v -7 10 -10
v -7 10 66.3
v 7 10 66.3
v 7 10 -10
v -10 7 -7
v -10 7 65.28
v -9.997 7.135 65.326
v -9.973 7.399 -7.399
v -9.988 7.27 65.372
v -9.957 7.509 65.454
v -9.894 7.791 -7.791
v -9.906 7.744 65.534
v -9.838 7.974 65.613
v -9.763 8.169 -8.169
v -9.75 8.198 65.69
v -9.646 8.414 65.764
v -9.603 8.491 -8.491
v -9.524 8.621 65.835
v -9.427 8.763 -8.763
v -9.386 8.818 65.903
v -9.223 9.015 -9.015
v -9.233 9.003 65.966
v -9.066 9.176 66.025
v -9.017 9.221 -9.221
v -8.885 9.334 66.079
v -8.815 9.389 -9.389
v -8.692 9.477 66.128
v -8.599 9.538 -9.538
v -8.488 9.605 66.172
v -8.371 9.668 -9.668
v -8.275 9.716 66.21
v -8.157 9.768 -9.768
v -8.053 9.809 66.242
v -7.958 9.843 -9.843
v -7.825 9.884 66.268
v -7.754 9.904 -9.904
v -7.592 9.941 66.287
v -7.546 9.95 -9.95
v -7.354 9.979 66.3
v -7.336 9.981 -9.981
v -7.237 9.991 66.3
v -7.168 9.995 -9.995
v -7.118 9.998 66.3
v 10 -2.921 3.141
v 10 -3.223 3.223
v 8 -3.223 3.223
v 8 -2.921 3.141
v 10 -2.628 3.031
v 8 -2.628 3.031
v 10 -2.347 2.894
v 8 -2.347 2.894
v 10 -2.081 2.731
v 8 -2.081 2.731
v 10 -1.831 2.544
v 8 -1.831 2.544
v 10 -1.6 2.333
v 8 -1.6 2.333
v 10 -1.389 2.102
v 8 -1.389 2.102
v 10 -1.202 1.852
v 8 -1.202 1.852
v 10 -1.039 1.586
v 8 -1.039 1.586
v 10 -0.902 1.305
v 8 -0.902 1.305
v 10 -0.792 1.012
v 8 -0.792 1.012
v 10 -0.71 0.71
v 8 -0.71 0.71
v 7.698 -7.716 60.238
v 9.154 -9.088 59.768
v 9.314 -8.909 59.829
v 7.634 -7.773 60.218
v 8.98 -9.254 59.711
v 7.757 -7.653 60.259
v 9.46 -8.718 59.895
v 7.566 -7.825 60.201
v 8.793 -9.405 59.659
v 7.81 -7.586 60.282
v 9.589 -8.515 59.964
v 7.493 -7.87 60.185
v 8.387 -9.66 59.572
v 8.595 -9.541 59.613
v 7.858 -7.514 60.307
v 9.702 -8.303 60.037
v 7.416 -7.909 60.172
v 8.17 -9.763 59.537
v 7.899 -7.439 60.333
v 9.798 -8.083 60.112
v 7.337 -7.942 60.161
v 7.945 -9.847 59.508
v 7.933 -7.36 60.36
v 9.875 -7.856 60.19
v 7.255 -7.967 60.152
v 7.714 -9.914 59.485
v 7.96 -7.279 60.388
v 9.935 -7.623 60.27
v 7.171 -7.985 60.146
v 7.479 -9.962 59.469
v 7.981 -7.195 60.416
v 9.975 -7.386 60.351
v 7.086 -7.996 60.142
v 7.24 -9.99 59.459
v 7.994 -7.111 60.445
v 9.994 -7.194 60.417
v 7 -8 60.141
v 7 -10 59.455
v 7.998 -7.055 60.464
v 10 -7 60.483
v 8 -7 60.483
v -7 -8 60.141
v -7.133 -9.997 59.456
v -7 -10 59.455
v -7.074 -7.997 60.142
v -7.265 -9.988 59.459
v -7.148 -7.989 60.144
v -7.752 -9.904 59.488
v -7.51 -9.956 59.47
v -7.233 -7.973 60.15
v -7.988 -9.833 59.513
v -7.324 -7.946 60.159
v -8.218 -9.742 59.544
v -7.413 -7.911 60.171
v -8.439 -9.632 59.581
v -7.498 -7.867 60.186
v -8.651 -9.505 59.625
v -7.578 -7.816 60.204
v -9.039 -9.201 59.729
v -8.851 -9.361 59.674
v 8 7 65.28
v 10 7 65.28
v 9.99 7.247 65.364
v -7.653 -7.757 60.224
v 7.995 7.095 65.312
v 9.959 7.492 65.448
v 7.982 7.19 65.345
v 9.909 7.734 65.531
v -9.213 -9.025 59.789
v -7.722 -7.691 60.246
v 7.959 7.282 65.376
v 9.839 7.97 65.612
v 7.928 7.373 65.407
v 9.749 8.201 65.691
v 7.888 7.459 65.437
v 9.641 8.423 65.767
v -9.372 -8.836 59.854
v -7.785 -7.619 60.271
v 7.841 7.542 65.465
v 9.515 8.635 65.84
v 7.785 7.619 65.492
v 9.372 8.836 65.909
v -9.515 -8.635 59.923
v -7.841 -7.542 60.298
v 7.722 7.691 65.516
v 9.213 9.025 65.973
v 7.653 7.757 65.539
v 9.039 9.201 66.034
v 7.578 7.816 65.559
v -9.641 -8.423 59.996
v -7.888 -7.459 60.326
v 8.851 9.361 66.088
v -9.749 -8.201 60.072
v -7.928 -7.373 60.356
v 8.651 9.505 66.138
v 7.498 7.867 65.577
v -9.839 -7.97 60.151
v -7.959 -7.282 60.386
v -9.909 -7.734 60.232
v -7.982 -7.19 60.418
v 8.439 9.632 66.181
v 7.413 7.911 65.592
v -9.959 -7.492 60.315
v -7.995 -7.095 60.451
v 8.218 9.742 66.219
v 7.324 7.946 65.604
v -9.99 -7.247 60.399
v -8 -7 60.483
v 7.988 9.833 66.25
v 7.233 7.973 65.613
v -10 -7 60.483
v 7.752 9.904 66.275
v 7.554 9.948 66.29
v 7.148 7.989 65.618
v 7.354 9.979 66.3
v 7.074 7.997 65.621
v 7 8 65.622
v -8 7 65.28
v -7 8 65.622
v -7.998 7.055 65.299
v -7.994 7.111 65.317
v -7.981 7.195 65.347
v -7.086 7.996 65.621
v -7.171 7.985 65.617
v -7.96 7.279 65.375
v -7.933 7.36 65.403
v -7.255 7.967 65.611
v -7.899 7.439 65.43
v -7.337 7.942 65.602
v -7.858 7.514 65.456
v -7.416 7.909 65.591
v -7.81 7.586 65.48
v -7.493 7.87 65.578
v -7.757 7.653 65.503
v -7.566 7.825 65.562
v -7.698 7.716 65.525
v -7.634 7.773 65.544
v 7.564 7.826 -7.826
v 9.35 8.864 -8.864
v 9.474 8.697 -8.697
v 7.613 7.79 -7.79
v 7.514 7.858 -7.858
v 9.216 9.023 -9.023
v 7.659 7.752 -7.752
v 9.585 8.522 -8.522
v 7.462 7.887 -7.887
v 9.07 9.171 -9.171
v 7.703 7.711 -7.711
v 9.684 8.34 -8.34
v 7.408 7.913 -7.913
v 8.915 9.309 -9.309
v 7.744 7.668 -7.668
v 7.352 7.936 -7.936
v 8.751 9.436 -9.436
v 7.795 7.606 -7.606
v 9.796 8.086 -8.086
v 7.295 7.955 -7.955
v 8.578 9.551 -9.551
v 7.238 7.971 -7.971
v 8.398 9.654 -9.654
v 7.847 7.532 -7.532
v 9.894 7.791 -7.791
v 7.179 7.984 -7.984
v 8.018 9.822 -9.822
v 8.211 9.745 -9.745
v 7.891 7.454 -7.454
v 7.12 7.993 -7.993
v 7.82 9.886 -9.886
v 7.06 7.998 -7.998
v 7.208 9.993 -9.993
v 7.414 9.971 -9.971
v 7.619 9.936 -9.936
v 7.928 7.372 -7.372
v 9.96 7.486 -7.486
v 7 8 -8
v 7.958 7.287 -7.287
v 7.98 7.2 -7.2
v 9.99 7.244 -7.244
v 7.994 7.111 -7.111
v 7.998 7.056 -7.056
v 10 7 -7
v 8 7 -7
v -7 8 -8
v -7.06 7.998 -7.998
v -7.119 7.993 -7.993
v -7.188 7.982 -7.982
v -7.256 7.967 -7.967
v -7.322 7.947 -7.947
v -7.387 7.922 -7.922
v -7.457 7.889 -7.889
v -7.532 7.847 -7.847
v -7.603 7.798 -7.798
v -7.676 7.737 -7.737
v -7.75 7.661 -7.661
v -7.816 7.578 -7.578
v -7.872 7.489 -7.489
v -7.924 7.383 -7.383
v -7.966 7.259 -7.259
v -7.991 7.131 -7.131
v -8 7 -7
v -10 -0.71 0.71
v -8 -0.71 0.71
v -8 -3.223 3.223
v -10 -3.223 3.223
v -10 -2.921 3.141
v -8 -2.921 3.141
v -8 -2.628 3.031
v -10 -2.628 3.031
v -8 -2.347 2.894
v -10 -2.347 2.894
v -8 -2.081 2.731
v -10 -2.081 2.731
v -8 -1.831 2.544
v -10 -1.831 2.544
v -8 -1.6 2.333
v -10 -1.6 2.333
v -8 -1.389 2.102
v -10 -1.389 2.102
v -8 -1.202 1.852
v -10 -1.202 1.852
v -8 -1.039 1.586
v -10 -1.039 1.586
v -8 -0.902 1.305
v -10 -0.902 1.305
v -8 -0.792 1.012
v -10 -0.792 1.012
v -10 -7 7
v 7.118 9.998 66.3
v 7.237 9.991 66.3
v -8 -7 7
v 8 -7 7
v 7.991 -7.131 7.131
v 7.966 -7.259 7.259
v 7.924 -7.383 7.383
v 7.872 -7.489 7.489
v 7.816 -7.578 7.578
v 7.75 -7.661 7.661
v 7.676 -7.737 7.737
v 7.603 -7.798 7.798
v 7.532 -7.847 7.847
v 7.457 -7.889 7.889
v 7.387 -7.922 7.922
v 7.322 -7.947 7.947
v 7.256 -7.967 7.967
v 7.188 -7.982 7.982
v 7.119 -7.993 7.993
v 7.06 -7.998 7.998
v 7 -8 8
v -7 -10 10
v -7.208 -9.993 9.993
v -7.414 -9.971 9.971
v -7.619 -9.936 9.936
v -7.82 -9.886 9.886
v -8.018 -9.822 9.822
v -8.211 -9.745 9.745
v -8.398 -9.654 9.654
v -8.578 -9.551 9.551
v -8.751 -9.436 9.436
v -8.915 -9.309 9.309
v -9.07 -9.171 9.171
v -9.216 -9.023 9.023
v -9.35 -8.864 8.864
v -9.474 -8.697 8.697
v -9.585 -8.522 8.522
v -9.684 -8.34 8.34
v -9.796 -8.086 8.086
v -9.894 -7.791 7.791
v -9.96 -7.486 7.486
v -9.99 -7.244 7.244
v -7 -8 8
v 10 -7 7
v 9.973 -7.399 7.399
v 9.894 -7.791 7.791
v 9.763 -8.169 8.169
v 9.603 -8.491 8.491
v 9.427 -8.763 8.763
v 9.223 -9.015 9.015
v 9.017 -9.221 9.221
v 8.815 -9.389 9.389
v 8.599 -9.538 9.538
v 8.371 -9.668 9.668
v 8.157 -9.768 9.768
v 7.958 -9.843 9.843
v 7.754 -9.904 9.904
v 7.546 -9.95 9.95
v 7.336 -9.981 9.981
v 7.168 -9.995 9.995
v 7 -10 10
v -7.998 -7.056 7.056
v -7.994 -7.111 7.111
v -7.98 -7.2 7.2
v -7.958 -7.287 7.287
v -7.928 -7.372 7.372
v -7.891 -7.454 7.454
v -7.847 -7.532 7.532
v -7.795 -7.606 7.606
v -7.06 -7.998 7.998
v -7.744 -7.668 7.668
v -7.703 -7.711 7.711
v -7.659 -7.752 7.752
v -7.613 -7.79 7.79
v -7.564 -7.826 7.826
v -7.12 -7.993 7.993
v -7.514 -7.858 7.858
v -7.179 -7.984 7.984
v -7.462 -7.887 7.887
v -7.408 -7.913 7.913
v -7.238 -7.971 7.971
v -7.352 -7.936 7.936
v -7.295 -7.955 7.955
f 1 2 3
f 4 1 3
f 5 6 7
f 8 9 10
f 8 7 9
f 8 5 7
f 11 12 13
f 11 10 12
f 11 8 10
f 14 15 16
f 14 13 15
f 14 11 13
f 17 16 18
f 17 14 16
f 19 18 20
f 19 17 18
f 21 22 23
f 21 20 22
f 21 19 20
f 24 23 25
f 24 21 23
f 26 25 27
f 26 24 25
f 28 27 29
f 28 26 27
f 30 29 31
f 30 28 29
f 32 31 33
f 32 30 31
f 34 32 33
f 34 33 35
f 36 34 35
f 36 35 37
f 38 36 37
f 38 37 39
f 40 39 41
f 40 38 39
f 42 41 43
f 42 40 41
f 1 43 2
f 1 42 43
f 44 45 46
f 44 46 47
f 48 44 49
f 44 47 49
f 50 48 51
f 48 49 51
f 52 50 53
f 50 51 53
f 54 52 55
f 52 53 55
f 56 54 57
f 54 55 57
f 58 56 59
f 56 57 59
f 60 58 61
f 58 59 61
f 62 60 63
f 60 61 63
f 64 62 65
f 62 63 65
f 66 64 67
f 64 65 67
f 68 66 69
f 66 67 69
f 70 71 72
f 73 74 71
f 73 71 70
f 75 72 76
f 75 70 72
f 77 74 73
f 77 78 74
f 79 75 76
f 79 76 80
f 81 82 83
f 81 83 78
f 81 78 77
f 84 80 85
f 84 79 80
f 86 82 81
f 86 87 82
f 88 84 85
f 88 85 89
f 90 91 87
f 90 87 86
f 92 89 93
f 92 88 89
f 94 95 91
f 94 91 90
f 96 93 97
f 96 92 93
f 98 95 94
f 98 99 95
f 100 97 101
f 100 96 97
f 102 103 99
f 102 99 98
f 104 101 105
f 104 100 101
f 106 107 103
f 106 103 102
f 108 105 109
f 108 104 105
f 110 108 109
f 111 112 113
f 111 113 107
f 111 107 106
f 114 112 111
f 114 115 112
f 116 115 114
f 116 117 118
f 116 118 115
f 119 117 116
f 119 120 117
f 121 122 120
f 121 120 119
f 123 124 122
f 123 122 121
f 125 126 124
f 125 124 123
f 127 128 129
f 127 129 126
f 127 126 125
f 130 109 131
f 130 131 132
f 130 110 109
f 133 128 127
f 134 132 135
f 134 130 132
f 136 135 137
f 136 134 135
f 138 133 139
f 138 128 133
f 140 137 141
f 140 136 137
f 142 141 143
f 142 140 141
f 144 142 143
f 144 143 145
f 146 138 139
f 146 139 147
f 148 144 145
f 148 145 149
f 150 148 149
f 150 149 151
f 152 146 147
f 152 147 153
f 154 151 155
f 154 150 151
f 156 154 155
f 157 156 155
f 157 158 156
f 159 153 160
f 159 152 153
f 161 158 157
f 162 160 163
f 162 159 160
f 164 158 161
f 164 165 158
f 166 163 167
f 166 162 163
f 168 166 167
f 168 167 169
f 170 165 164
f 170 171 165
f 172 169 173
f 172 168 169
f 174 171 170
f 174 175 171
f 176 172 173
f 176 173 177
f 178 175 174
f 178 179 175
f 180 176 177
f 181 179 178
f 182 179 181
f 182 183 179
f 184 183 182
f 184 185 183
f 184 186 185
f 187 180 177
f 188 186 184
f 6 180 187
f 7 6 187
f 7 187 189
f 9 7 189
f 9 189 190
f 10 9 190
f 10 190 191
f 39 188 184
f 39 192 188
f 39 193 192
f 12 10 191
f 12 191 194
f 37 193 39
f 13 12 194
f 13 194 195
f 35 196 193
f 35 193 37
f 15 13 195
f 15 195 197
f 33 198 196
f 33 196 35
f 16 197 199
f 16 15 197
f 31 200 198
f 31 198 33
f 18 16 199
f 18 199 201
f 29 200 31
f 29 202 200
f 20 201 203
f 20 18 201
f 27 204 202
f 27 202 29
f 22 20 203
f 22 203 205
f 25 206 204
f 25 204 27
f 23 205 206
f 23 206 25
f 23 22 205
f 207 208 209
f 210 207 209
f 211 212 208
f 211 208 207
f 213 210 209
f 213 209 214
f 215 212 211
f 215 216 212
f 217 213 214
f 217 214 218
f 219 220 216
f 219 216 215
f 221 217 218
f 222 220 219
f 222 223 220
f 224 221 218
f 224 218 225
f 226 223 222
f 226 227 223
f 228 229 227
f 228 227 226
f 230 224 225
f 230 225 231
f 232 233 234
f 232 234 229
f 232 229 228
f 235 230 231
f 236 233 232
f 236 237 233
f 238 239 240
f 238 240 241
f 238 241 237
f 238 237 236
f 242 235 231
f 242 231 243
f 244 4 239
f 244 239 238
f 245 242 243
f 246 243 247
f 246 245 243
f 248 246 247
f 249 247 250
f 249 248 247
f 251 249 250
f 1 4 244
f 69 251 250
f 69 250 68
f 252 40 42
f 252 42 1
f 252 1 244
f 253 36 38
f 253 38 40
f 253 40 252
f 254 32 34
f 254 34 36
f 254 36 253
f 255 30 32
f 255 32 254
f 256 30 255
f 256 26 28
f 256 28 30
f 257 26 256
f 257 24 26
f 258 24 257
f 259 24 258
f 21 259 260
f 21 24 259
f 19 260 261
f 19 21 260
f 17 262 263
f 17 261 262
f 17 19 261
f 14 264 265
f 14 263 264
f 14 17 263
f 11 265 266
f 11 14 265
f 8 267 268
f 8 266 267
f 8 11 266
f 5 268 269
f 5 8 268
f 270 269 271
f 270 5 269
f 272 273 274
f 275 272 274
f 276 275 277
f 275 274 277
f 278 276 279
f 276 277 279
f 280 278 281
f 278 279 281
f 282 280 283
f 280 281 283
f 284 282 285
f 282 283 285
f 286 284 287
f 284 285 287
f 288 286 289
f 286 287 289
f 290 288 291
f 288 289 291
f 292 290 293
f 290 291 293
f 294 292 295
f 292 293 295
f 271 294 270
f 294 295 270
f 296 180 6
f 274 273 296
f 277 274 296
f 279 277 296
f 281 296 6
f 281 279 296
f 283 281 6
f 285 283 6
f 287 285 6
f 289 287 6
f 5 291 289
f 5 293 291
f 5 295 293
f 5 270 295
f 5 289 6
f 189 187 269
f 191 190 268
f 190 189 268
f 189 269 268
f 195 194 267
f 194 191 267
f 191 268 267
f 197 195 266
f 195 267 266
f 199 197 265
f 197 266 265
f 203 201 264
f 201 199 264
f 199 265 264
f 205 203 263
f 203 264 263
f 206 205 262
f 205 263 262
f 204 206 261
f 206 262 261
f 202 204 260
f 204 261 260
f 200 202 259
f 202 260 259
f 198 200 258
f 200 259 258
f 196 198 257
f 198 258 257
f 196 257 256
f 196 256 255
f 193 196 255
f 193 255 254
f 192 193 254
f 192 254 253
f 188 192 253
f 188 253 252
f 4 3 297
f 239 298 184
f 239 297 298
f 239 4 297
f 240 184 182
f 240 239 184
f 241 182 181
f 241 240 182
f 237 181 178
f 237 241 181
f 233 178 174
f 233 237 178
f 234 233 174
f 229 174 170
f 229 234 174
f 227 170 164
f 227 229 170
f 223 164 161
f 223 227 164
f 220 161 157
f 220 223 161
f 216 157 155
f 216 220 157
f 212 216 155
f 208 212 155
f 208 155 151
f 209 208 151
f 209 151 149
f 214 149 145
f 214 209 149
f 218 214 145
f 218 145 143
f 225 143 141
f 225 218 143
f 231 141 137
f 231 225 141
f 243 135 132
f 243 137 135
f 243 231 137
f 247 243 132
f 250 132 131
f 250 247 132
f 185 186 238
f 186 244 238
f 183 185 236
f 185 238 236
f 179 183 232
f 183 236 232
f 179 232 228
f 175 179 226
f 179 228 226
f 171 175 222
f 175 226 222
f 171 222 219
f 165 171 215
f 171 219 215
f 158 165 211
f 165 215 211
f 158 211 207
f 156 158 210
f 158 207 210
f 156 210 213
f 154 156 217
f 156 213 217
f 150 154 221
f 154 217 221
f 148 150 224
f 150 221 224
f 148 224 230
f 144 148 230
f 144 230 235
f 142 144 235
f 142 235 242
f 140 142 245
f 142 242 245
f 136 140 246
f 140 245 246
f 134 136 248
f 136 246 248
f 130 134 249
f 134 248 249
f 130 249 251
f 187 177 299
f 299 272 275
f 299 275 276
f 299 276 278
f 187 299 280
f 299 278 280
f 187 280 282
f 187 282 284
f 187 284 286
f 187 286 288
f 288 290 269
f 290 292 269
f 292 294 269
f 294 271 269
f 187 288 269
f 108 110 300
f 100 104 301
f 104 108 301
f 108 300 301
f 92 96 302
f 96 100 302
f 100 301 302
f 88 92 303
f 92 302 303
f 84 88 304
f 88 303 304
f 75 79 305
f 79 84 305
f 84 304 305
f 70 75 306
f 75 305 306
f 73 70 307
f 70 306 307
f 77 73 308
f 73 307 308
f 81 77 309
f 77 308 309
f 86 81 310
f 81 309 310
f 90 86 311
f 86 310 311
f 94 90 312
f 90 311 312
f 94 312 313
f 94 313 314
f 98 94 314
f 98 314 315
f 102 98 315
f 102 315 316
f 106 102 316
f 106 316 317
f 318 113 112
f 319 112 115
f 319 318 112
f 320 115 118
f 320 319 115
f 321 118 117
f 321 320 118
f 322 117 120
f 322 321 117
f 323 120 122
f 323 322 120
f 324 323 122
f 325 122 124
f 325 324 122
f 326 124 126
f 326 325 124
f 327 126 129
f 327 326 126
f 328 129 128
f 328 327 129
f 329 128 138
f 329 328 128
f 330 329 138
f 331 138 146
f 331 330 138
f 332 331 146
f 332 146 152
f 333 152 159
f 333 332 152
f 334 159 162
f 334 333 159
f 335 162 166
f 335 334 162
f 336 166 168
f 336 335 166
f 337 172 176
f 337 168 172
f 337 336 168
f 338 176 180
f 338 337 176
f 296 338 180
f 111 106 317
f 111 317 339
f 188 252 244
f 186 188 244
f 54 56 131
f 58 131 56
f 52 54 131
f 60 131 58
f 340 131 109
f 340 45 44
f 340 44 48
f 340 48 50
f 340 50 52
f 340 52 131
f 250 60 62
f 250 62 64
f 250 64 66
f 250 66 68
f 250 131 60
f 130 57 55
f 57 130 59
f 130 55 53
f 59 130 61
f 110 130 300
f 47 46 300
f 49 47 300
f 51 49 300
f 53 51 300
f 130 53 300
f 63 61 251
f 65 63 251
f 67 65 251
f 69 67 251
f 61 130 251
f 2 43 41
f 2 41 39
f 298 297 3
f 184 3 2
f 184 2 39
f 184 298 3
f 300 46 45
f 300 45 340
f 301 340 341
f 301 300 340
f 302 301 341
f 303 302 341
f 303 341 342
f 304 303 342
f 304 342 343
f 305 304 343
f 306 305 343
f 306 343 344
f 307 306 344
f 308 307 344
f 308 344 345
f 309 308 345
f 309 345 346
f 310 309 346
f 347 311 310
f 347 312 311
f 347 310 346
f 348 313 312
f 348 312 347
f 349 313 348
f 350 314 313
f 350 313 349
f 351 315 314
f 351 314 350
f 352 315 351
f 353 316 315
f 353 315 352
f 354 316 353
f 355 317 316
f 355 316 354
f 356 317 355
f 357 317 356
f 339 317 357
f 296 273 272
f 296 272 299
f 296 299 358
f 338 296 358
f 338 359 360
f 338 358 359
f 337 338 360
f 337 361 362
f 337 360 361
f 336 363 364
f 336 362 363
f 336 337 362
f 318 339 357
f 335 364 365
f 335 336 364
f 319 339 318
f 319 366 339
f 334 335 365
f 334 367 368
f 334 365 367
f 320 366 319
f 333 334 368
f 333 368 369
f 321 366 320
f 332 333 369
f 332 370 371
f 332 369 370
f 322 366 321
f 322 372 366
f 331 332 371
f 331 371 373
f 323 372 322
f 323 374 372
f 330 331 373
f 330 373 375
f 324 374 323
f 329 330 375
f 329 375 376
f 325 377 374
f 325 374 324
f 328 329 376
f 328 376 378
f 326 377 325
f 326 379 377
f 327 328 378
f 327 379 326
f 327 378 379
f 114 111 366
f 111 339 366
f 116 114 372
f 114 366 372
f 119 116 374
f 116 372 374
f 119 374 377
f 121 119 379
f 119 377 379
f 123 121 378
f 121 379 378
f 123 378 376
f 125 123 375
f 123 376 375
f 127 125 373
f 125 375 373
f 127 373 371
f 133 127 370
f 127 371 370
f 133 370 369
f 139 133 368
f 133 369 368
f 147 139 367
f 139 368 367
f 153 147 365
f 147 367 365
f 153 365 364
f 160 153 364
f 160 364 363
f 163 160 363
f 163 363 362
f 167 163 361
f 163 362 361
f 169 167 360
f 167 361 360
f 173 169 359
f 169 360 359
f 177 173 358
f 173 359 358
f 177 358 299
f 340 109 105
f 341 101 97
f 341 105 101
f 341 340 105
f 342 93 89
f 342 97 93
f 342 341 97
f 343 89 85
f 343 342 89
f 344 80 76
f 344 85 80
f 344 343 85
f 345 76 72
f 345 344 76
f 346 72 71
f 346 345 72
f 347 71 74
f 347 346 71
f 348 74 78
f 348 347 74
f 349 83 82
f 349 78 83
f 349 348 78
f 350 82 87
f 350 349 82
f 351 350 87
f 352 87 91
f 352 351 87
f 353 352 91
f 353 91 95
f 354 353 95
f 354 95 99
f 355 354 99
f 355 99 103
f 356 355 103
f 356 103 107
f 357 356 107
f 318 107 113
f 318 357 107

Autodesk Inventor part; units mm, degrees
ref_plane "Start Plane" through (0, 0, -10) normal (0, 0, 1) x (1, 0, 0)
ref_plane "End Plane" through (0, 0, 66.3002) normal (0, 0, 1) x (1, 0, 0)
sketch "Sketch" plane through (0, 0, 0) normal (0, 0, 1) x (1, 0, 0)
  line L0 (-10, -7) -> (-10, 7)
  line L1 (-7, 10) -> (7, 10)
  line L2 (10, 7) -> (10, -7)
  line L3 (7, -10) -> (-7, -10)
  arc A0 (-10, -7) -> (-7, -10) centre (-7, -7) ccw
  arc A1 (-7, 10) -> (-10, 7) centre (-7, 7) ccw
  arc A2 (10, 7) -> (7, 10) centre (7, 7) ccw
  arc A3 (7, -10) -> (10, -7) centre (7, -7) ccw
  arc A4 (-7, 8) -> (-8, 7) centre (-7, 7) ccw
  line L4 (-7, 8) -> (7, 8)
  arc A5 (8, 7) -> (7, 8) centre (7, 7) ccw
  line L5 (8, 7) -> (8, -7)
  arc A6 (7, -8) -> (8, -7) centre (7, -7) ccw
  line L6 (7, -8) -> (-7, -8)
  arc A7 (-8, -7) -> (-7, -8) centre (-7, -7) ccw
  line L7 (-8, -7) -> (-8, 7)
  line L8 (0, 14.8698) -> (0, -14.8698) construction
  line L9 (-14.8698, 0) -> (14.8698, 0) construction
  dimension "d7" = 3
  dimension "d10" = 20
  dimension "d11" = 20
  dimension "d12" = 2
  dimension "d15" = 10
  dimension "d16" = 10
extrude "Body" add sketch "Sketch" along normal up to surface (76.3002 mm away) from surface at -10
sketch "Sketch3" plane through (0, 0, 0) normal (0, 0, 1) x (1, 0, 0)
  line L0 (0, 0) -> (10, 0)
ref_plane "Work Plane3" through (0, 0, 0) normal (0, -1, 0) x (1, 0, 0)
sketch "Sketch4" plane through (0, 0, 0) normal (0, -1, 0) x (1, 0, 0)
  line L0 (-2, -10) -> (12, -10)
  line L1 (-2, 66.3002) -> (12, 66.3002)
  dimension "d18" = 76.3002
ref_plane "Work Plane4" through (7, 153.7024, 115.5399) normal (0, -0.3241, 0.946) x (1, 0, 0)
split "Split1" plane through (7, 153.7024, 115.5399) removes the side toward (0, -0.3241, 0.946)
ref_plane "Work Plane6" through (0, 10, -10) normal (0, -0.7071, -0.7071) x (1, 0, 0)
split "Split3" plane through (0, 10, -10) removes the side toward (0, -0.7071, -0.7071)
sketch "Sketch6" plane through (10, 7, 65.2722) normal (1, 0, 0) x (0, 0, -1)
  point P0 (65.2722, -10.933)
hole "Hole2" at (10, -3.933, 0) direction (-1, 0, 0) diameter 6.6 depth 2
sketch "Sketch7" plane through (-8, 7, 65.2722) normal (1, 0, 0) x (0, 0, -1)
  point P0 (65.2722, -10.933)
hole "Hole3" at (-8, -3.933, 0) direction (-1, 0, 0) diameter 6.6 end through all
equation "\"d7\" = G_IR"
equation "\"d10\" = G_H"
equation "\"d11\" = G_W"
equation "\"d12\" = G_T"
equation "\"d15\" = 0.5 * d10"
equation "\"d16\" = 0.5 * d11"
equation "\"d3\" = G_L"
equation "\"G_W\" = 20"
equation "\"G_H\" = 20"
equation "\"G_T\" = 2"
equation "\"G_IR\" = 3"
equation "\"G_L\" = d18"
equation "\"G_OFFSET_END\" = -7.14425"
equation "\"d14\" = G_OFFSET_END + B_L"
equation "\"B_L\" = 73.44444"
properties part number "ISO 12633-2 - 20x20x2 - 76,3" material "Steel, Mild"
